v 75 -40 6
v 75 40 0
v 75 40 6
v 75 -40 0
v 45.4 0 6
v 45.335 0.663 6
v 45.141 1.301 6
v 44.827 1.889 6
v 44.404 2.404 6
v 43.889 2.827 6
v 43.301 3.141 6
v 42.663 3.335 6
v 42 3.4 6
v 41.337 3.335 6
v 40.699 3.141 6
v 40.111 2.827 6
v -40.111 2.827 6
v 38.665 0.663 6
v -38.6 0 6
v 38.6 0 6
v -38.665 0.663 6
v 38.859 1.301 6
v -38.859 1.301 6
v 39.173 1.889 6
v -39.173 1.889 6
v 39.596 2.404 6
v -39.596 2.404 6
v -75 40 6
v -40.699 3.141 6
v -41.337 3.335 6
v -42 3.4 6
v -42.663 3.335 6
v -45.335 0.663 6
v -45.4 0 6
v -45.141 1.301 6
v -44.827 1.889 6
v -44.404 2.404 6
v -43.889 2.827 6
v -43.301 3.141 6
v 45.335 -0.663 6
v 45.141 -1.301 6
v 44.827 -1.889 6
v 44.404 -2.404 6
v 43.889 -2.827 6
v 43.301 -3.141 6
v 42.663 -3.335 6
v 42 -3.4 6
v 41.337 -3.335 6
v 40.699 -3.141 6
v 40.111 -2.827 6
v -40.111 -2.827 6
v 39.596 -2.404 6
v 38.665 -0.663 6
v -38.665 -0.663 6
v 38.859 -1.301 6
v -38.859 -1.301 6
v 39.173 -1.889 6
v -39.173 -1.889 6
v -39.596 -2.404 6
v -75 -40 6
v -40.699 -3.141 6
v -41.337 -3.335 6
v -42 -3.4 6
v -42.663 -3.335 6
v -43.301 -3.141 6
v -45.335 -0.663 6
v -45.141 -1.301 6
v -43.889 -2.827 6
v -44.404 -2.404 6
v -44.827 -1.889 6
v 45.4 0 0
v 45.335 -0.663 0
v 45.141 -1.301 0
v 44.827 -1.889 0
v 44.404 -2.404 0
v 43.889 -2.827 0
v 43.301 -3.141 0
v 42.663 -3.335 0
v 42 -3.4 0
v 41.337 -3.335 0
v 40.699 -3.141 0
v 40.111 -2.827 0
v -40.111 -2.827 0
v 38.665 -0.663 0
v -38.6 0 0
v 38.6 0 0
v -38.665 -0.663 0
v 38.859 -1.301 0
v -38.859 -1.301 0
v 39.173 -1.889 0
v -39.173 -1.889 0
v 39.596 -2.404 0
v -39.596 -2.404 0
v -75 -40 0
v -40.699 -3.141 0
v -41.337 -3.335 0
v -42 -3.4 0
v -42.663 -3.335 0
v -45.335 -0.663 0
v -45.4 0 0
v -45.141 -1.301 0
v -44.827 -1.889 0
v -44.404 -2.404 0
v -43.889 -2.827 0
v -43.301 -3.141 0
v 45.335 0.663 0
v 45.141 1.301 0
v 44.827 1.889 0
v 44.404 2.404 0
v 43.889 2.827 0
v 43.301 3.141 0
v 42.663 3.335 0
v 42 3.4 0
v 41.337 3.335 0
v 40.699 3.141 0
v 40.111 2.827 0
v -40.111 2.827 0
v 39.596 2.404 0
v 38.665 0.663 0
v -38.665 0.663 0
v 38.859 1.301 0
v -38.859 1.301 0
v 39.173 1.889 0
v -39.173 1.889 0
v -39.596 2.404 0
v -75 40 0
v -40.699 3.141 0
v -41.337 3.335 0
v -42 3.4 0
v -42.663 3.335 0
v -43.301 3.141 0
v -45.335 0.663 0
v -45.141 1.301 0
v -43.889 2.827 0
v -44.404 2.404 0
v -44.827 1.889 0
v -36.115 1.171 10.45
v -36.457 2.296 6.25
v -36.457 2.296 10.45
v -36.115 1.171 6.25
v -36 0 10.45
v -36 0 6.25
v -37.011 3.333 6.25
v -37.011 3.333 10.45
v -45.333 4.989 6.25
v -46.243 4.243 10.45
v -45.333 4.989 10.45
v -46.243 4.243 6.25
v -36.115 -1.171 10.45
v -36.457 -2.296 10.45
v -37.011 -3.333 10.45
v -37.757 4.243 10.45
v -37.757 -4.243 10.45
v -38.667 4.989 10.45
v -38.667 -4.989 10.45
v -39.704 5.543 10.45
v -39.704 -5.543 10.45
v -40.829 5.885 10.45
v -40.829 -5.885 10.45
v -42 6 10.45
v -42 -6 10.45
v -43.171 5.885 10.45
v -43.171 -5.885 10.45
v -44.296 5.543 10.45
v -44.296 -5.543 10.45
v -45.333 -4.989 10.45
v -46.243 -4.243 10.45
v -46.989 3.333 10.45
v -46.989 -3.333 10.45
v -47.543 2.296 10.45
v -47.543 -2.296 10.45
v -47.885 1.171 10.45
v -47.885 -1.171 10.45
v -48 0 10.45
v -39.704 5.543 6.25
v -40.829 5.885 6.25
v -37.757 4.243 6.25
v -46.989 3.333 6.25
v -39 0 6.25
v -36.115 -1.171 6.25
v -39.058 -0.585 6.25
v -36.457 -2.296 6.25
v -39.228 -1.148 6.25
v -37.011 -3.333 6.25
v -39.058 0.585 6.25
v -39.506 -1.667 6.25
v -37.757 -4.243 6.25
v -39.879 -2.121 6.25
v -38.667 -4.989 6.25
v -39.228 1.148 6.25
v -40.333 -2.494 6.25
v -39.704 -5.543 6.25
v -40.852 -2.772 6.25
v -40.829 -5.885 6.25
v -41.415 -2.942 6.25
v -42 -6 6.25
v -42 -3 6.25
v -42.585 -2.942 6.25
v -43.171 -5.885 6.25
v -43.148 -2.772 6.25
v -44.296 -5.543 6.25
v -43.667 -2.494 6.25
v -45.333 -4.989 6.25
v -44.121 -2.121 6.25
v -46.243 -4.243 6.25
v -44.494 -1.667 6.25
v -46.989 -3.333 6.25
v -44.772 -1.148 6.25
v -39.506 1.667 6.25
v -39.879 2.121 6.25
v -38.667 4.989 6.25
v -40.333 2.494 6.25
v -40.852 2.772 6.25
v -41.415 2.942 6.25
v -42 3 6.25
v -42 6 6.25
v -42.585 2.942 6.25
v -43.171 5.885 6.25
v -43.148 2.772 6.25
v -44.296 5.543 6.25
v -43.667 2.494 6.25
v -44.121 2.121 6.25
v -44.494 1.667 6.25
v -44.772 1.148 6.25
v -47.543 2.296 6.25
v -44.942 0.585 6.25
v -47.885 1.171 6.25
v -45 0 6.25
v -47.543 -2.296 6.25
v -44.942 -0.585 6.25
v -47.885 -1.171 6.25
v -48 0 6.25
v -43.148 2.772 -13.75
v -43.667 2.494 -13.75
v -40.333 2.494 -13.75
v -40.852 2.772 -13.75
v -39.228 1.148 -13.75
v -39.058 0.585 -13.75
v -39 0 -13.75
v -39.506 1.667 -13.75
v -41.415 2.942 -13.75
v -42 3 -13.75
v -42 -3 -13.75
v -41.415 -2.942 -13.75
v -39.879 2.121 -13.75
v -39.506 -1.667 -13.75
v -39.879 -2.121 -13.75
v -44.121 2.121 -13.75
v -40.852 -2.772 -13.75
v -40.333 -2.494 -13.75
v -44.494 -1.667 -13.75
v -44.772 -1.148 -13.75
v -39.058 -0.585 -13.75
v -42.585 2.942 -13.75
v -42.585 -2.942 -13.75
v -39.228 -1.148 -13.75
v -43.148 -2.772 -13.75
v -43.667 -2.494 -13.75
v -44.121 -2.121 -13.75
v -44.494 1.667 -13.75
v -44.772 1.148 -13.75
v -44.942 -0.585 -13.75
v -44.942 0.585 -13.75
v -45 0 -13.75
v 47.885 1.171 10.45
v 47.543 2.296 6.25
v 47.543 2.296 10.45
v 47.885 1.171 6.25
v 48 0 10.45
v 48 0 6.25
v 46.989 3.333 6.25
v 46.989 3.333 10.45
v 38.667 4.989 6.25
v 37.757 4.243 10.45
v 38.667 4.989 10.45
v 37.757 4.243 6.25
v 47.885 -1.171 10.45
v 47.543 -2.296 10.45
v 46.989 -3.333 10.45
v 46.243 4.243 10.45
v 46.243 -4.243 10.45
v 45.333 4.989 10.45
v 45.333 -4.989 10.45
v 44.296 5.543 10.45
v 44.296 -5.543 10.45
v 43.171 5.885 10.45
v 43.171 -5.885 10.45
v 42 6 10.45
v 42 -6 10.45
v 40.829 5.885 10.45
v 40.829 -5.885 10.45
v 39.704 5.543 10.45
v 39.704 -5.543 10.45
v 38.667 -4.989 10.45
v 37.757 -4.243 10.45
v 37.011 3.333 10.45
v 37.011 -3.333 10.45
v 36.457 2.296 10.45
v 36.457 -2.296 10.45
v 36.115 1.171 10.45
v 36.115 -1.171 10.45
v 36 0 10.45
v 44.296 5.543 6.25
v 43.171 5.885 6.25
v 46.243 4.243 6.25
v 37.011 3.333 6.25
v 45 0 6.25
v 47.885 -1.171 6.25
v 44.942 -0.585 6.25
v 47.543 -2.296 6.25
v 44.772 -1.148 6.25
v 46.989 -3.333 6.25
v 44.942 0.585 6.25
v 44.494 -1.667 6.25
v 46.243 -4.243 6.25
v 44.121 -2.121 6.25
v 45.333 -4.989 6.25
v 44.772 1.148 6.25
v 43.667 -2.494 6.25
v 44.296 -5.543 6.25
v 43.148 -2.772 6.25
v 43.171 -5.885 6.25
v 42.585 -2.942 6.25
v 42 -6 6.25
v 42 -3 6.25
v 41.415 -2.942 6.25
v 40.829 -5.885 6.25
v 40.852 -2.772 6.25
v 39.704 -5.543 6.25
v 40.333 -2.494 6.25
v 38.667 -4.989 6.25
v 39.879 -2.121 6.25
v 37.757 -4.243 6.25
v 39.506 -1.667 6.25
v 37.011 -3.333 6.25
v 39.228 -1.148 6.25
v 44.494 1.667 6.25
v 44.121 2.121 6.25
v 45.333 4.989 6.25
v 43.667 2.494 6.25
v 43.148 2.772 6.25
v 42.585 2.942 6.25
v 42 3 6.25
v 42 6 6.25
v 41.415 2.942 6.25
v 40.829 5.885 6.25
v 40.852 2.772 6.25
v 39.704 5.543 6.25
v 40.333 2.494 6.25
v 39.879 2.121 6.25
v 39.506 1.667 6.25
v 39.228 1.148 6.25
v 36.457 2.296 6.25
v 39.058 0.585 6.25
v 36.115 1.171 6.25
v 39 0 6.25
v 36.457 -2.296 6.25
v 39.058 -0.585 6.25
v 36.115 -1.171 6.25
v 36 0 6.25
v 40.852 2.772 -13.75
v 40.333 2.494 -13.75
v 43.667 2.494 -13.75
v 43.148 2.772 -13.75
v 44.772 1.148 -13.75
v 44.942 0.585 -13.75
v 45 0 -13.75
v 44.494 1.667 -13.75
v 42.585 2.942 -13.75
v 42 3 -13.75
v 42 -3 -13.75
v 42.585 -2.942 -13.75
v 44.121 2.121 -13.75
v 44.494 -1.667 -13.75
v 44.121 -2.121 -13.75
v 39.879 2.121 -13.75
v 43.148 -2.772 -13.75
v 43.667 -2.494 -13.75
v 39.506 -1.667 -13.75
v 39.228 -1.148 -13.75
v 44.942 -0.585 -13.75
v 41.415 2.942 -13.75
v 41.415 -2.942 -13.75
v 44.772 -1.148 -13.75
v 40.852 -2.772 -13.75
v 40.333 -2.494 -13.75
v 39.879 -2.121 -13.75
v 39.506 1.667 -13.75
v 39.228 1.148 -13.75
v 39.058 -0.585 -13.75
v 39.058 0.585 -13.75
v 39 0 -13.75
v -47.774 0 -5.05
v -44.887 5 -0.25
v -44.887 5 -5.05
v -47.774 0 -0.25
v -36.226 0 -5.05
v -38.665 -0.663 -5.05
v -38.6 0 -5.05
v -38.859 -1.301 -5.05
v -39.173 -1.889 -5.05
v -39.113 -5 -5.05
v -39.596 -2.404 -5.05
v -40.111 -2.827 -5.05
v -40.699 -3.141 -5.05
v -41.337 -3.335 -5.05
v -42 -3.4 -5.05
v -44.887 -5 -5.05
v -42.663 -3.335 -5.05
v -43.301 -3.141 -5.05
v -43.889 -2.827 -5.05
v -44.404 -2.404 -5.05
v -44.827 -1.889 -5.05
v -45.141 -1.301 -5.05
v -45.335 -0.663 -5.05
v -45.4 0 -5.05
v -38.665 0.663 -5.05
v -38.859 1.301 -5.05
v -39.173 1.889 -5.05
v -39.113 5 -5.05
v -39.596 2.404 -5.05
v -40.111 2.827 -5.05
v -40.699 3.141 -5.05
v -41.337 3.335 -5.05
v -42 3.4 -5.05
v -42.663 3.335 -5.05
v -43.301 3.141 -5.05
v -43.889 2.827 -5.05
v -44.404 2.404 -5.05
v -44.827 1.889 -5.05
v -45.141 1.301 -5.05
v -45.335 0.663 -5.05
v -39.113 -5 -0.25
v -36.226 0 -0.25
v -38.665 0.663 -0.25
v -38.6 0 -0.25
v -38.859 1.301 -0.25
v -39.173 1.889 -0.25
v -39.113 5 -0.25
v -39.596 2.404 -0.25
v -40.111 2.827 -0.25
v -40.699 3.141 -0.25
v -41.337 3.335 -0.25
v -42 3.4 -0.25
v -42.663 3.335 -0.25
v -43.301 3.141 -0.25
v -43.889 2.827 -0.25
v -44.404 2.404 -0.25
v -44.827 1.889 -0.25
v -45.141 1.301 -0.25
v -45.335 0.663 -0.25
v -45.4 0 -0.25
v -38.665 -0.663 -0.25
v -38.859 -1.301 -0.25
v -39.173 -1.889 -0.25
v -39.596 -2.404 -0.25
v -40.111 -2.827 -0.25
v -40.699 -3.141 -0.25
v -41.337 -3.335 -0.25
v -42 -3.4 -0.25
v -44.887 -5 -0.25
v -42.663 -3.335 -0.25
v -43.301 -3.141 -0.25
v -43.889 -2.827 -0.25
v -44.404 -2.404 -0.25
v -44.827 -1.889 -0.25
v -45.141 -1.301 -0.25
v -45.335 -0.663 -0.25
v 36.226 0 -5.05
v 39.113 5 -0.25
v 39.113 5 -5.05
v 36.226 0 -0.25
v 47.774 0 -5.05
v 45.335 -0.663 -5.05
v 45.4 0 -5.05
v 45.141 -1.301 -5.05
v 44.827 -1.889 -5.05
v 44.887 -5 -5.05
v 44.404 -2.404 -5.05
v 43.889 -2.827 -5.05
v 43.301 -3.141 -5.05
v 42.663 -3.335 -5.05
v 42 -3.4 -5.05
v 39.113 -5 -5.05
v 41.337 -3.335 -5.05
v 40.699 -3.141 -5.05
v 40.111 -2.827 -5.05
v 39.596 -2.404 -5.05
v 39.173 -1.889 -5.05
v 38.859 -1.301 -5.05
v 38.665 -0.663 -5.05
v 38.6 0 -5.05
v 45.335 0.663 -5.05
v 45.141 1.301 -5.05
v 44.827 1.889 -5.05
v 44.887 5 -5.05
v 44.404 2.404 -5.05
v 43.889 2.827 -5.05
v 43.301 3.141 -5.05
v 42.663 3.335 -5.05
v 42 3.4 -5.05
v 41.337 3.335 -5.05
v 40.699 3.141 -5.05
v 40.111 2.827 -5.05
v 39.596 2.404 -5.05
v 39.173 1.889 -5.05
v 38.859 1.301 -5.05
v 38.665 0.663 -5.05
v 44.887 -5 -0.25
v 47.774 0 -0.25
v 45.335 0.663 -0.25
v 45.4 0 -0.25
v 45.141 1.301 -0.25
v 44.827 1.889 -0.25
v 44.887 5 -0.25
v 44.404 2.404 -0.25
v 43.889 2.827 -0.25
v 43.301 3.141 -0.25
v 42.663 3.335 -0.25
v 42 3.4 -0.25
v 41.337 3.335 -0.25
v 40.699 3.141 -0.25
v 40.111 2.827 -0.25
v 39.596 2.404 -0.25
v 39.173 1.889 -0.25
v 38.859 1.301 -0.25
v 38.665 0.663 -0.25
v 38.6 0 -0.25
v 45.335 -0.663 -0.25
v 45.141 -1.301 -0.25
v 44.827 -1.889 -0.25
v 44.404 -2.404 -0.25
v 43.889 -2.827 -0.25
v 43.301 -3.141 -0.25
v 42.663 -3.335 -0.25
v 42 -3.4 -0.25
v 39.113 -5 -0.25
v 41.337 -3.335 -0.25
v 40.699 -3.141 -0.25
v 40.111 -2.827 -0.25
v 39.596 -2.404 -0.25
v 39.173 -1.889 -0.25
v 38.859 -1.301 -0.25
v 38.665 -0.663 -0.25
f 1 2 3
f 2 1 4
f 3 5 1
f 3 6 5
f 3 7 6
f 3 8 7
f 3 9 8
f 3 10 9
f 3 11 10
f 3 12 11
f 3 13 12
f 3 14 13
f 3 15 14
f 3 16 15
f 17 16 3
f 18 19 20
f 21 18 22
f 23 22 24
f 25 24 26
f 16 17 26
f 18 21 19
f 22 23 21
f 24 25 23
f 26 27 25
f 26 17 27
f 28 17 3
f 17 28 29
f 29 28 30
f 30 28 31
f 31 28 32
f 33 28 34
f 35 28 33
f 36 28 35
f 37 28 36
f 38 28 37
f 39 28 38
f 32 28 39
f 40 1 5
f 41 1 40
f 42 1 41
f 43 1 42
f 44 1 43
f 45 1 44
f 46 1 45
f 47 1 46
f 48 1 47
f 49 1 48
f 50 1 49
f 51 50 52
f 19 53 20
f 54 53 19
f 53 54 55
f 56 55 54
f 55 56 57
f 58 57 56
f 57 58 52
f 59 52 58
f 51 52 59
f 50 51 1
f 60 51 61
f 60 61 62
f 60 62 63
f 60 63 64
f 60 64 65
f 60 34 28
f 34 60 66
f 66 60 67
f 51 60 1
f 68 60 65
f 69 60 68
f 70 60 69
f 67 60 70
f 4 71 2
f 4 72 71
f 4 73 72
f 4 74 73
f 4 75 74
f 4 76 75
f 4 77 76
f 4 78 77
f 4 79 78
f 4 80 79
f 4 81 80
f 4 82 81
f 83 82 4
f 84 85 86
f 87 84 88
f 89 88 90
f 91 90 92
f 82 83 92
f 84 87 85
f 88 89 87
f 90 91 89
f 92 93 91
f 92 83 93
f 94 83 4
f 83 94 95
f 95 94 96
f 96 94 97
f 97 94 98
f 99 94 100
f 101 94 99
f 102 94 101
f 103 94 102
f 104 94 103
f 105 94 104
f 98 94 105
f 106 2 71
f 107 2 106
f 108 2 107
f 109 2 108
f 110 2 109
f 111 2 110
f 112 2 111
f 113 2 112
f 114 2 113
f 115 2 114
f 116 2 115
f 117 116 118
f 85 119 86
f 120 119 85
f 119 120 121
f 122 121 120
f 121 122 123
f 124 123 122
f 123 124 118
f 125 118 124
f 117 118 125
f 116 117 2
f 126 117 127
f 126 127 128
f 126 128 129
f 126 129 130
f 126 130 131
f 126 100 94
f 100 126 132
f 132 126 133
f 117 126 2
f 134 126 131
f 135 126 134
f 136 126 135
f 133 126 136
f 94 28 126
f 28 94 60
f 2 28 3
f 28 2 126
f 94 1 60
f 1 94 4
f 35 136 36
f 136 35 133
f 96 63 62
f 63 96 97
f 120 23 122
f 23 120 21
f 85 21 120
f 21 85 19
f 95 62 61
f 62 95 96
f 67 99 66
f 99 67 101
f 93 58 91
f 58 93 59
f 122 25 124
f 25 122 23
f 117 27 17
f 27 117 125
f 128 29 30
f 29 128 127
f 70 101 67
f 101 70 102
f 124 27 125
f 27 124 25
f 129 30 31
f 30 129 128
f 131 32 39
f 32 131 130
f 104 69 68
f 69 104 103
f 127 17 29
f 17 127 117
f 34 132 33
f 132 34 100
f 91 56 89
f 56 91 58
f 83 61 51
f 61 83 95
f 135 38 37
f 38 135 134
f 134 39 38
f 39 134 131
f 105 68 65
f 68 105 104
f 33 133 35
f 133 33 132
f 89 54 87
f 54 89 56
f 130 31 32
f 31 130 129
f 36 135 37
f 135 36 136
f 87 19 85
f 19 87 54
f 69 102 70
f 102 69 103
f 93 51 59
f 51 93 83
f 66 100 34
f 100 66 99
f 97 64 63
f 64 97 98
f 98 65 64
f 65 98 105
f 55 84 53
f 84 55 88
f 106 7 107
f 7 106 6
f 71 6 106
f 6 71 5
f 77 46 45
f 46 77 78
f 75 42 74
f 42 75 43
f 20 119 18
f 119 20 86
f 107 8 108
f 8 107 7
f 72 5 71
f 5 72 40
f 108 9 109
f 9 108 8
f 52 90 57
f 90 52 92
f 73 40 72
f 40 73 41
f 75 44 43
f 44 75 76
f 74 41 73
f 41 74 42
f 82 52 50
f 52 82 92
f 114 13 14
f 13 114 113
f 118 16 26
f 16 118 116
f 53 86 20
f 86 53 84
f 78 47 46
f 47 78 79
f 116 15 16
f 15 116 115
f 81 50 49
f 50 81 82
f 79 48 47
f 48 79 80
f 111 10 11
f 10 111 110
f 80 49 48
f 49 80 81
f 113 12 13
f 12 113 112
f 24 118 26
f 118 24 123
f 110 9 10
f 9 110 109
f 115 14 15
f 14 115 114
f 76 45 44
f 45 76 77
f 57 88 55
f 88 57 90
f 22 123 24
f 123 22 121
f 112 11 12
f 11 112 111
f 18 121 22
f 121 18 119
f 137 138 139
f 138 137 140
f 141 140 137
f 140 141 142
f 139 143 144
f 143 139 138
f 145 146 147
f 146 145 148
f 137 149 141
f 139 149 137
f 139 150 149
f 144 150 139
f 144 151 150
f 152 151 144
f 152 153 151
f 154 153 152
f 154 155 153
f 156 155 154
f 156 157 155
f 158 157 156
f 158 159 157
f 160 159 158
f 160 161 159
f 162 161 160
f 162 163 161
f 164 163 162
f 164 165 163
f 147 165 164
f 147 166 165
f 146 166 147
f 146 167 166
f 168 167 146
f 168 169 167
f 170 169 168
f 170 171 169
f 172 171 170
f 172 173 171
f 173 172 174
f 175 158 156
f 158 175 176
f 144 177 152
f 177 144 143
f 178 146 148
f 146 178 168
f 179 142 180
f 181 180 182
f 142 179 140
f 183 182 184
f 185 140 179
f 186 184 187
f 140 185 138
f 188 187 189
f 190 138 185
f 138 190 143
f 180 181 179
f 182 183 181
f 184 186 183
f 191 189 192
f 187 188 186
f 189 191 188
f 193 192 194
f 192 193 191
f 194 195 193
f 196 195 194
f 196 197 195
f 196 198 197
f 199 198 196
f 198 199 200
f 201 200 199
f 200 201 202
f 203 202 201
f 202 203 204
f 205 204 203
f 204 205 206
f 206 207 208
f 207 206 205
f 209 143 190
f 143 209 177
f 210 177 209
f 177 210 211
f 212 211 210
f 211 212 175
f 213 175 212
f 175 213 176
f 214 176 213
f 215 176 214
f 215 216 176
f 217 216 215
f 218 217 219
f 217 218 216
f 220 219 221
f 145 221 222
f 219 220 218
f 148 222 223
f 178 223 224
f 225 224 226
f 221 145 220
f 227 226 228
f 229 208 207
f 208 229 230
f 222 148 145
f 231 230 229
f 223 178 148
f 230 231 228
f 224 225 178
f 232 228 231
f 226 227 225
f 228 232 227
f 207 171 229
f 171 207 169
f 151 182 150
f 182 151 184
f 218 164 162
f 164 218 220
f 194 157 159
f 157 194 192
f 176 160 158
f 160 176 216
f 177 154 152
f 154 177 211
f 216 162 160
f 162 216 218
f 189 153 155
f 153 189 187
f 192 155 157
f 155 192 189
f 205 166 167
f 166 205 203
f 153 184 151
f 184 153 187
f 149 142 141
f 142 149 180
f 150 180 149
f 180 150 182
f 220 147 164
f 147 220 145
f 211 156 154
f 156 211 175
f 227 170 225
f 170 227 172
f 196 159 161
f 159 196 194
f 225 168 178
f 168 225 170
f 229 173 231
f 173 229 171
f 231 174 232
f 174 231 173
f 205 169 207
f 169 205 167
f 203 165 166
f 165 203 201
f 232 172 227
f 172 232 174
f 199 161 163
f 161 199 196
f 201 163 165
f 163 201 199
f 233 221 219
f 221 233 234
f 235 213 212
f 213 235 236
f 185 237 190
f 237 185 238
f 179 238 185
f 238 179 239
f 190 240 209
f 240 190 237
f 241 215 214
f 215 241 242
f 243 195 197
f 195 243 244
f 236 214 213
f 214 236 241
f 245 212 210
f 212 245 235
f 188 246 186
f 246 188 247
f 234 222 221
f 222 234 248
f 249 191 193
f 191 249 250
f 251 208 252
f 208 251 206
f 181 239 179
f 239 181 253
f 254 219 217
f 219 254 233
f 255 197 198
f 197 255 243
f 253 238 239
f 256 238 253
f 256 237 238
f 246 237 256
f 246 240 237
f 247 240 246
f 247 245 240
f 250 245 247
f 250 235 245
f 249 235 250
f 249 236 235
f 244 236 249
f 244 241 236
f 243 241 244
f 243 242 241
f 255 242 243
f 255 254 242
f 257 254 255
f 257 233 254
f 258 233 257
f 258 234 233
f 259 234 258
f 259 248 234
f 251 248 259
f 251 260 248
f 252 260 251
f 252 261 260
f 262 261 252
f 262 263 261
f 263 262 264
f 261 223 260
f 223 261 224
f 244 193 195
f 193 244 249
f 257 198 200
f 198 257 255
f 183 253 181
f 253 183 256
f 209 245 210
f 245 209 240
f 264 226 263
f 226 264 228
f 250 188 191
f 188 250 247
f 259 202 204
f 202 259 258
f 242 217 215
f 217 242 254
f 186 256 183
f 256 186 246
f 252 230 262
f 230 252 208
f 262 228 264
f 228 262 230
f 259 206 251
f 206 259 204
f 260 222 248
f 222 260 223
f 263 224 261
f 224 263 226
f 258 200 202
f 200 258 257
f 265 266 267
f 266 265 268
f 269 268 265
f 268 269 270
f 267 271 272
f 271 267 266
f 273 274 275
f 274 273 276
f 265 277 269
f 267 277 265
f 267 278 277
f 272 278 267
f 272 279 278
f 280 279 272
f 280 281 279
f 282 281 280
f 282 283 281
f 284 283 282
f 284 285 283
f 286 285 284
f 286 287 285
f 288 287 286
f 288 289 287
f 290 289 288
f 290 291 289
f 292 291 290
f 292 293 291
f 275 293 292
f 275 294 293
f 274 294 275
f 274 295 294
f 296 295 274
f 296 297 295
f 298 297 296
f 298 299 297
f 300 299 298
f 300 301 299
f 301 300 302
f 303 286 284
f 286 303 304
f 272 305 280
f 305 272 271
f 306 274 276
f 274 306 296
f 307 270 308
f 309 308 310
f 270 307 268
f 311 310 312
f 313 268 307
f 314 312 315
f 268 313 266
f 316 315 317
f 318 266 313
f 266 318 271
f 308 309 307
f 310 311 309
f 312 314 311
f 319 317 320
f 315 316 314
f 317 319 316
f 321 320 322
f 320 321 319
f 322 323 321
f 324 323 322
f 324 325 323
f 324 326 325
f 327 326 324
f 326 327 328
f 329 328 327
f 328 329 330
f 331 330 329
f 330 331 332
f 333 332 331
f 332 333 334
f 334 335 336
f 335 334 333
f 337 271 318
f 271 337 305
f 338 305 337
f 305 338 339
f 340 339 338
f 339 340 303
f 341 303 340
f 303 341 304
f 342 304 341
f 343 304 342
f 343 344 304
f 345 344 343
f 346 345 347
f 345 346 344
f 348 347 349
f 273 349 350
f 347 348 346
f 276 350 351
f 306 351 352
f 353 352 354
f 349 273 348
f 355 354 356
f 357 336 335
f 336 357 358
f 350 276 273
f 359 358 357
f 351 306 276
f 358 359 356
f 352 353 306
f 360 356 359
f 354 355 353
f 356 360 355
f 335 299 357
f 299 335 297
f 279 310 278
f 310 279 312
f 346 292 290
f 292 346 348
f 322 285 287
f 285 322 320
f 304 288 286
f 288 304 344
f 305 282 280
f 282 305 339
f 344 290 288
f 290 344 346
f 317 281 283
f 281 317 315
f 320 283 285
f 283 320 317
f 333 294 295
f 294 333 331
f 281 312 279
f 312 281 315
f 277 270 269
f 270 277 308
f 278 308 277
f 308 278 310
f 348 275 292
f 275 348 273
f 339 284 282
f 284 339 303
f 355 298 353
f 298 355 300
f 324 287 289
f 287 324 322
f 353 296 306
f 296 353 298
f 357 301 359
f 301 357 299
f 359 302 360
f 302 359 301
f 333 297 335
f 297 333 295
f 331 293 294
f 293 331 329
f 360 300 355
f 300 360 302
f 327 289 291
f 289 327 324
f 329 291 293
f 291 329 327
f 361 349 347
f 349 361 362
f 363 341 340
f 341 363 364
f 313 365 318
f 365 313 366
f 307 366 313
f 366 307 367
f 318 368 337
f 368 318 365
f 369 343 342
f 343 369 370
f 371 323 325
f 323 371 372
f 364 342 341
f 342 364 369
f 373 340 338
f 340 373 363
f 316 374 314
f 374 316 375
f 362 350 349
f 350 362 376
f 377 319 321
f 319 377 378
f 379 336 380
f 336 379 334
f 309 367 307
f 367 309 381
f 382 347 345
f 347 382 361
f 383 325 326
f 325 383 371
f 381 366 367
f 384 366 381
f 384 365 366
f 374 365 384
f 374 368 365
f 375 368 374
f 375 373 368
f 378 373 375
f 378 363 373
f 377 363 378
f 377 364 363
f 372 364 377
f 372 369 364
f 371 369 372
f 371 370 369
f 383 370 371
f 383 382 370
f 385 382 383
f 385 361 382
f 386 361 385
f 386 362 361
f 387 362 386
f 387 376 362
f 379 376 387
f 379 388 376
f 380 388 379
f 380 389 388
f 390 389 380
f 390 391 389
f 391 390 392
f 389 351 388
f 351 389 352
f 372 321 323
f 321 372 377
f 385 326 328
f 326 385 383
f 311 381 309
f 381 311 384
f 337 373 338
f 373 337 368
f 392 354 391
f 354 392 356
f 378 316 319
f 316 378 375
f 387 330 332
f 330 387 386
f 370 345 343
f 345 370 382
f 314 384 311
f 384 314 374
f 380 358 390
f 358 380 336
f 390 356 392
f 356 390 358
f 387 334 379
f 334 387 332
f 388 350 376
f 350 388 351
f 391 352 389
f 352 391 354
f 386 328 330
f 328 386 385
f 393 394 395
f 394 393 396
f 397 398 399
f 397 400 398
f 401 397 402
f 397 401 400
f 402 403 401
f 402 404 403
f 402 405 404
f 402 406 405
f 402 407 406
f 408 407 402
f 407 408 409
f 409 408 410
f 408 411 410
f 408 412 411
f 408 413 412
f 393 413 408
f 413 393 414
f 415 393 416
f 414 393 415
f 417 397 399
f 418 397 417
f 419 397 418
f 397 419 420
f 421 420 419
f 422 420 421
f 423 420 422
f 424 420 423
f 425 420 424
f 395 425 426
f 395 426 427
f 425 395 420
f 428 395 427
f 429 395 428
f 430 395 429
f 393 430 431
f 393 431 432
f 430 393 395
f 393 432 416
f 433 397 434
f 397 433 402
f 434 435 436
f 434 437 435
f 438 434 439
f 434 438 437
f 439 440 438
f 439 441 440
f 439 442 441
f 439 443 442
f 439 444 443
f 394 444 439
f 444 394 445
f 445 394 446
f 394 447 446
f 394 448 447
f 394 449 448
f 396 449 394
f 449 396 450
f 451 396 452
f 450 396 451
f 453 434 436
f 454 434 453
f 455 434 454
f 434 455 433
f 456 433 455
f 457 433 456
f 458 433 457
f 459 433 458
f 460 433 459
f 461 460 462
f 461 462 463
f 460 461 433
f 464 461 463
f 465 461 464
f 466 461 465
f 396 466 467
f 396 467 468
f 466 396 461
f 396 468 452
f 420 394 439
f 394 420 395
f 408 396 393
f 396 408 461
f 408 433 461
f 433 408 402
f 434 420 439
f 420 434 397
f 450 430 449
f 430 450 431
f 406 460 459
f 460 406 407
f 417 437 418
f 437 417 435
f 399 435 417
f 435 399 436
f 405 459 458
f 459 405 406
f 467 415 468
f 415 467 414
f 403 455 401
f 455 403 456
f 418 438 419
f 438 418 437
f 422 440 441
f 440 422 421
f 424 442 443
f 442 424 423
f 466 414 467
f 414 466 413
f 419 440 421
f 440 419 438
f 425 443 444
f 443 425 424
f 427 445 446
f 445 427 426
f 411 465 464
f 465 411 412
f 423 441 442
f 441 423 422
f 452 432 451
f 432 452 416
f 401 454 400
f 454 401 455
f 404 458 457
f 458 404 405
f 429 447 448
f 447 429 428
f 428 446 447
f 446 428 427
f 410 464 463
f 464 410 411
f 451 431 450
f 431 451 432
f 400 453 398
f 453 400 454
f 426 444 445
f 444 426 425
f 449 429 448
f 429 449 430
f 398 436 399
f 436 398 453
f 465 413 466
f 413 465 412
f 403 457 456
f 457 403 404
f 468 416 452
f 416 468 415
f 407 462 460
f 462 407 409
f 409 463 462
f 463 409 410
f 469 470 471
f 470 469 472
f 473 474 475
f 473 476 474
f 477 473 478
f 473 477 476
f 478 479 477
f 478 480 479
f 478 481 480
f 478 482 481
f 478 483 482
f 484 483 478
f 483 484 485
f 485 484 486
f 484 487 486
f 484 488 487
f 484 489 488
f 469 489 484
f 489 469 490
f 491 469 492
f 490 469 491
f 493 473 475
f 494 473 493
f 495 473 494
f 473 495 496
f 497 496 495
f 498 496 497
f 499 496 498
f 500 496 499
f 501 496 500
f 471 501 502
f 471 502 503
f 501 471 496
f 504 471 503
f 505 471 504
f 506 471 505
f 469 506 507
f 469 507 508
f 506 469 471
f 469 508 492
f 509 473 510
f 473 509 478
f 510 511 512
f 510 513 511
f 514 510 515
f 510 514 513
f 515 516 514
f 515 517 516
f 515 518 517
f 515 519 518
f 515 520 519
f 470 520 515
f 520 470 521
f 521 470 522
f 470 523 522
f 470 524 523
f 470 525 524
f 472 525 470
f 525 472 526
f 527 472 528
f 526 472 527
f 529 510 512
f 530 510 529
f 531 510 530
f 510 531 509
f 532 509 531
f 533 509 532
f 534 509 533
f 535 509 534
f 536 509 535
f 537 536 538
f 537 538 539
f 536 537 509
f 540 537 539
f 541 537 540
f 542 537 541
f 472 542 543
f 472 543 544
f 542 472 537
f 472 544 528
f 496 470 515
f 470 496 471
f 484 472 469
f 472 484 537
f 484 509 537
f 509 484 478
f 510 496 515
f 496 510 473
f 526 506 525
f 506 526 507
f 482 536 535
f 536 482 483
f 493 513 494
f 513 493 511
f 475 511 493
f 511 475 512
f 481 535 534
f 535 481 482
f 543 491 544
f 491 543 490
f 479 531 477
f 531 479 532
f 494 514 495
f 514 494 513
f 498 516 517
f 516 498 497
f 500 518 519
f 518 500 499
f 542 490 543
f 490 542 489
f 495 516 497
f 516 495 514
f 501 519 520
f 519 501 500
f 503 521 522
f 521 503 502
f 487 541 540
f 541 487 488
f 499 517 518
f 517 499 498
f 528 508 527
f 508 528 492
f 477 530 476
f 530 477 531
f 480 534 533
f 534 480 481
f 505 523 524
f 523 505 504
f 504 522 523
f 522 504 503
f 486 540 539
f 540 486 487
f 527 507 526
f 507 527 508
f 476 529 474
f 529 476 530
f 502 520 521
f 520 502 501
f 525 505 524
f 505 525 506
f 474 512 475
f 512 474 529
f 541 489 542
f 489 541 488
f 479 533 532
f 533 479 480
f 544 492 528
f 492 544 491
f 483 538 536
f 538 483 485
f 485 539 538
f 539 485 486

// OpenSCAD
$fn = 32;

// ------------------------------------------------------------------------
// Bolted plate: 150 x 80 x 6 mm plate, 2 fasteners
// Every part is its own module, assembly() places them once.
// ------------------------------------------------------------------------

// --- part 1 ---
module plate() {
  difference() {
    translate([-75, -40, 0]) cube([150, 80, 6]);
    translate([-42, 0, -1]) cylinder(h = 8, d = 6.8);
    translate([42, 0, -1]) cylinder(h = 8, d = 6.8);
  }
}

// --- part 2 ---
module bolt1() {
  cylinder(h = 4.2, d = 12);
  translate([0, 0, -20]) cylinder(h = 20, d = 6);
}

// --- part 3 ---
module bolt2() {
  cylinder(h = 4.2, d = 12);
  translate([0, 0, -20]) cylinder(h = 20, d = 6);
}

// --- part 4 ---
module nut1() {
  difference() {
    linear_extrude(height = 4.8) polygon(points = [[5.774, 0], [2.887, 5], [-2.887, 5], [-5.774, 0], [-2.887, -5], [2.887, -5]]);
    translate([0, 0, -1]) cylinder(h = 6.8, d = 6.8);
  }
}

// --- part 5 ---
module nut2() {
  difference() {
    linear_extrude(height = 4.8) polygon(points = [[5.774, 0], [2.887, 5], [-2.887, 5], [-5.774, 0], [-2.887, -5], [2.887, -5]]);
    translate([0, 0, -1]) cylinder(h = 6.8, d = 6.8);
  }
}

// --- assembly ---
module assembly() {
  translate([0, 0, 0]) rotate([0, 0, 0]) plate();
  translate([-42, 0, 6.25]) rotate([0, 0, 0]) bolt1();
  translate([42, 0, 6.25]) rotate([0, 0, 0]) bolt2();
  translate([-42, 0, -5.05]) rotate([0, 0, 0]) nut1();
  translate([42, 0, -5.05]) rotate([0, 0, 0]) nut2();
}

assembly();
